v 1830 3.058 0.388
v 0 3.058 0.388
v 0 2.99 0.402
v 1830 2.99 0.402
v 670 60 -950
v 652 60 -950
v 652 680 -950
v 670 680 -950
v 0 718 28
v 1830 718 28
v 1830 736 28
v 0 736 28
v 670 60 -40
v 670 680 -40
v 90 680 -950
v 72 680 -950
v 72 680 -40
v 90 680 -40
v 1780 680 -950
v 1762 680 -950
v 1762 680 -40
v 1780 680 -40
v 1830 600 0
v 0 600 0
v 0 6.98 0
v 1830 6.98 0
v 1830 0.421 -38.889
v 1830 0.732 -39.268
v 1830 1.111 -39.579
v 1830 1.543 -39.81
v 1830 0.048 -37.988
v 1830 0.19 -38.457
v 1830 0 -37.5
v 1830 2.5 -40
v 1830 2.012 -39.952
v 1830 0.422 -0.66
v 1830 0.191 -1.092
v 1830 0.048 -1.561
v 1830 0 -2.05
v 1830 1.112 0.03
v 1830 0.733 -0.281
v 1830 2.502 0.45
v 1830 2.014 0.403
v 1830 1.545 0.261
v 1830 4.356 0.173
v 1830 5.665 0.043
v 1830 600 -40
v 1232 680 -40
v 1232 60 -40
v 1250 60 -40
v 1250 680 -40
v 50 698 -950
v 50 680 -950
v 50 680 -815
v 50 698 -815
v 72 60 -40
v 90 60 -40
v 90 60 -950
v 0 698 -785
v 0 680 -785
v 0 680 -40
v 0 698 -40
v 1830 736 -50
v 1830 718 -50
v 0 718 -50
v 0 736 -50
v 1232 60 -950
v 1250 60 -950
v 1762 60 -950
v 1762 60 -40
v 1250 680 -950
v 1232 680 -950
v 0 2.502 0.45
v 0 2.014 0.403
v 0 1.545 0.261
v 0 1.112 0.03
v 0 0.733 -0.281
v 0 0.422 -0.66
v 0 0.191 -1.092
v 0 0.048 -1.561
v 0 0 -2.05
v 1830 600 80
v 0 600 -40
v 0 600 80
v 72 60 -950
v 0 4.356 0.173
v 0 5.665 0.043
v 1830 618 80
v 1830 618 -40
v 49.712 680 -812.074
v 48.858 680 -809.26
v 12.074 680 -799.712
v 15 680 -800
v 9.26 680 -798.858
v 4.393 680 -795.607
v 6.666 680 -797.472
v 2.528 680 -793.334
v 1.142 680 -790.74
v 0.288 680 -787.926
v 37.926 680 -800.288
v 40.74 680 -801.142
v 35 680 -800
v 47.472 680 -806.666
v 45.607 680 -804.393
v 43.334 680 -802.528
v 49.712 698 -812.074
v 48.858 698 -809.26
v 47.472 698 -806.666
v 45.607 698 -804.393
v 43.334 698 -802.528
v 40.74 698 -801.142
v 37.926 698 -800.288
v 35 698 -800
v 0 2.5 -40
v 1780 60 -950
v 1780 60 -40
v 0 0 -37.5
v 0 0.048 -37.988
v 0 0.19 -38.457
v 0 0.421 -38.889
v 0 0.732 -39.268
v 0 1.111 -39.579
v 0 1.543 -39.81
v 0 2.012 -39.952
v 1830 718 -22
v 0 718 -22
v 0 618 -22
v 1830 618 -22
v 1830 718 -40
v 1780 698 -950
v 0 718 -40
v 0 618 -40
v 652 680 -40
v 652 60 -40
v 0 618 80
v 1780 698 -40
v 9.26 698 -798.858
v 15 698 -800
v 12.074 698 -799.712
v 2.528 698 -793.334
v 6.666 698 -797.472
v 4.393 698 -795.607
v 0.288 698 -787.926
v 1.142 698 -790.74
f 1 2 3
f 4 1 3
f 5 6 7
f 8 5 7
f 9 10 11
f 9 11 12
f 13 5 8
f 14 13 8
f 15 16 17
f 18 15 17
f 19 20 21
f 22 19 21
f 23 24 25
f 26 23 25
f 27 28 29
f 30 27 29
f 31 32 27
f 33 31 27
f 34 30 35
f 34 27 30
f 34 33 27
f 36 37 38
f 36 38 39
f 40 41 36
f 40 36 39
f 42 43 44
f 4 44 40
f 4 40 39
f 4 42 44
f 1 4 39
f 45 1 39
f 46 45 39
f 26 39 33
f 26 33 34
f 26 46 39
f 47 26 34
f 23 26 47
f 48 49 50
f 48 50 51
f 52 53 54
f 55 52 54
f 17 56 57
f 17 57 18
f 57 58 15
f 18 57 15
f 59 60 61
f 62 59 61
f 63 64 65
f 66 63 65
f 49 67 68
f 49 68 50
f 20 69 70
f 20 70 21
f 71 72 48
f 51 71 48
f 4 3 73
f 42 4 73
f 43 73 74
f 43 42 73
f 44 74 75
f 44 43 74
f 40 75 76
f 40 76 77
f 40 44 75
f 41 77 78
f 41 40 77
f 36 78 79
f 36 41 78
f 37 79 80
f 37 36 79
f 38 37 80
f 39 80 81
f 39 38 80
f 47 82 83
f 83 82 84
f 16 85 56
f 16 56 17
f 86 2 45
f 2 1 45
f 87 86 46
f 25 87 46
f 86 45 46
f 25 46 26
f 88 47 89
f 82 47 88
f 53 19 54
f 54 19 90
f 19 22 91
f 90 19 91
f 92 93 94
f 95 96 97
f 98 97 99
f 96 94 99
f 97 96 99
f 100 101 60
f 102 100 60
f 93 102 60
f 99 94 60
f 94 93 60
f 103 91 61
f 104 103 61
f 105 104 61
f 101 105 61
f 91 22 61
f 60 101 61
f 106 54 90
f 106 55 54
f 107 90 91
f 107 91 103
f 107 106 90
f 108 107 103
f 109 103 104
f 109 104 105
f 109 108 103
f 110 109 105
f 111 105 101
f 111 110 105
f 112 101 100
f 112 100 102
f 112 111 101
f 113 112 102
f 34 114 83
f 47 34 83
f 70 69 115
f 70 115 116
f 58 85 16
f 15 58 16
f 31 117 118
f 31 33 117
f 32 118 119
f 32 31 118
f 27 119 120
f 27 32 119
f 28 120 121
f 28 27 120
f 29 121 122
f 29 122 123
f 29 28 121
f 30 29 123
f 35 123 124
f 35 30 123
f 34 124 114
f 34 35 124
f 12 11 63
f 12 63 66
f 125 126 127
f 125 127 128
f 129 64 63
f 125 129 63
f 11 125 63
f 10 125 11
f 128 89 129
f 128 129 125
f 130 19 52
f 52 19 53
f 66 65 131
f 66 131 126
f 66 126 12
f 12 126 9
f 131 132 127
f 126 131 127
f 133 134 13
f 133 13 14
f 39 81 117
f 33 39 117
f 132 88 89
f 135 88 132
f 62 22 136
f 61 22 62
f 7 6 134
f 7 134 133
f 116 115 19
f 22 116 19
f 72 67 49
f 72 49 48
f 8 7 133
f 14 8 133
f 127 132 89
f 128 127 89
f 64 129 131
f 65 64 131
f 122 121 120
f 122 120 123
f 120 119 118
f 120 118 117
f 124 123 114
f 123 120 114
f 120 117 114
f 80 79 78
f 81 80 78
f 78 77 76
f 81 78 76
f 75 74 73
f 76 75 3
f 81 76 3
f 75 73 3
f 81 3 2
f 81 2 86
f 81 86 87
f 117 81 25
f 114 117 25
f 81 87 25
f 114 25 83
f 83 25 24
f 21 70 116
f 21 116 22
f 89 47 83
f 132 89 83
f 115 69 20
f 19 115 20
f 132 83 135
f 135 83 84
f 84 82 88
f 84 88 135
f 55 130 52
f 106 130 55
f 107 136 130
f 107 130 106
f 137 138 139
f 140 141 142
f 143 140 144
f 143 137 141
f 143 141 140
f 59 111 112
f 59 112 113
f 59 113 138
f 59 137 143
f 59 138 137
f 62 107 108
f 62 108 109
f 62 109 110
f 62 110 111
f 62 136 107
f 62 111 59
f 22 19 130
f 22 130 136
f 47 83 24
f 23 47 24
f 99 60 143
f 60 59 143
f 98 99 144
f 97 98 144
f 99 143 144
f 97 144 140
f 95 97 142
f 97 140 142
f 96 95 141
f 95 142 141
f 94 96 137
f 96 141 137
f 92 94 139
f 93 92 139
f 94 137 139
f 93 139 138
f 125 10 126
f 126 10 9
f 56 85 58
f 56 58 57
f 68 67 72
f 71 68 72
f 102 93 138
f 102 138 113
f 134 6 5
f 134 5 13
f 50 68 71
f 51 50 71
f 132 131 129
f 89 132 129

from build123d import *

# Parameters (mm, degrees)
F1_DEPTH  = 1830
F2_R      = 2.5
F3_R      = 20
F5_W      = 620
F5_H      = 910
F6_DEPTH  = 18
F8_W      = 620
F8_H      = 910
F9_DEPTH  = 18
F11_W     = 620
F11_H     = 910
F12_DEPTH = 18
F14_W     = 620
F14_H     = 910
F15_DEPTH = 18
F17_W     = 1780
F17_H     = 910
F18_DEPTH = 18
F20_W     = 1830
F20_H     = 120
F21_DEPTH = 18
F23_W     = 1830
F23_H     = 100
F24_DEPTH = 18
F26_W     = 1830
F26_H     = 78
F27_DEPTH = 18
F29_W     = 50
F29_H     = 150
F30_DEPTH = 56.001
F31_R     = 15


with BuildPart() as f1:
    # F0 (on Right) → F1 (new body)
    with BuildSketch(Plane.YZ):
        Polygon((600, -40), (600, 0), (5, 0), (0, 1), (0, -40), align=None)
    extrude(amount=F1_DEPTH)

    # F2
    f2_edges = [f1.edges().sort_by_distance(p)[0] for p in [
        (915, 0, 1),
        (915, 0, -40),
    ]]
    fillet(f2_edges, radius=F2_R)

    # F3
    f3_edges = [f1.edges().sort_by_distance(p)[0] for p in [
        (915, 5, 0),
    ]]
    fillet(f3_edges, radius=F3_R)


with BuildPart() as f6:
    # F5 (on offset) → F6 (new body)
    with BuildSketch(Plane.YZ.offset(1762)):
        with Locations((370, -495)):
            Rectangle(F5_W, F5_H)
    extrude(amount=F6_DEPTH)


with BuildPart() as f9:
    # F8 (on offset) → F9 (new body)
    with BuildSketch(Plane.YZ.offset(1232)):
        with Locations((370, -495)):
            Rectangle(F8_W, F8_H)
    extrude(amount=F9_DEPTH)


with BuildPart() as f12:
    # F11 (on offset) → F12 (new body)
    with BuildSketch(Plane.YZ.offset(652)):
        with Locations((370, -495)):
            Rectangle(F11_W, F11_H)
    extrude(amount=F12_DEPTH)


with BuildPart() as f15:
    # F14 (on offset) → F15 (new body)
    with BuildSketch(Plane.YZ.offset(72)):
        with Locations((370, -495)):
            Rectangle(F14_W, F14_H)
    extrude(amount=F15_DEPTH)


with BuildPart() as f18:
    # F17 (on offset) → F18 (new body)
    with BuildSketch(Plane(origin=(0, 680, 0), x_dir=(-1, 0, 0), z_dir=(0, 1, 0))):
        with Locations((-890, -495)):
            Rectangle(F17_W, F17_H)
    extrude(amount=F18_DEPTH)

    # F29 (on offset) → F30 (cut, through all)
    with BuildSketch(Plane.XZ.offset(-680)):
        with Locations((25, -875)):
            Rectangle(F29_W, F29_H)
    extrude(amount=-F30_DEPTH, mode=Mode.SUBTRACT)

    # F31
    f31_edges = [f18.edges().sort_by_distance(p)[0] for p in [
        (50, 689, -800),
        (0, 689, -800),
    ]]
    fillet(f31_edges, radius=F31_R)


with BuildPart() as f21:
    # F20 (on offset) → F21 (new body)
    with BuildSketch(Plane(origin=(0, 600, 0), x_dir=(-1, 0, 0), z_dir=(0, 1, 0))):
        with Locations((-915, 20)):
            Rectangle(F20_W, F20_H)
    extrude(amount=F21_DEPTH)


with BuildPart() as f24:
    # F23 (on offset) → F24 (new body)
    with BuildSketch(Plane.XY.offset(-40)):
        with Locations((915, 668)):
            Rectangle(F23_W, F23_H)
    extrude(amount=F24_DEPTH)

    # F26 (on offset) → F27 (join)
    with BuildSketch(Plane(origin=(0, 718, 0), x_dir=(-1, 0, 0), z_dir=(0, 1, 0))):
        with Locations((-915, -11)):
            Rectangle(F26_W, F26_H)
    extrude(amount=F27_DEPTH)


solid = Compound([f1.part, f6.part, f9.part, f12.part, f15.part, f18.part, f21.part, f24.part])
